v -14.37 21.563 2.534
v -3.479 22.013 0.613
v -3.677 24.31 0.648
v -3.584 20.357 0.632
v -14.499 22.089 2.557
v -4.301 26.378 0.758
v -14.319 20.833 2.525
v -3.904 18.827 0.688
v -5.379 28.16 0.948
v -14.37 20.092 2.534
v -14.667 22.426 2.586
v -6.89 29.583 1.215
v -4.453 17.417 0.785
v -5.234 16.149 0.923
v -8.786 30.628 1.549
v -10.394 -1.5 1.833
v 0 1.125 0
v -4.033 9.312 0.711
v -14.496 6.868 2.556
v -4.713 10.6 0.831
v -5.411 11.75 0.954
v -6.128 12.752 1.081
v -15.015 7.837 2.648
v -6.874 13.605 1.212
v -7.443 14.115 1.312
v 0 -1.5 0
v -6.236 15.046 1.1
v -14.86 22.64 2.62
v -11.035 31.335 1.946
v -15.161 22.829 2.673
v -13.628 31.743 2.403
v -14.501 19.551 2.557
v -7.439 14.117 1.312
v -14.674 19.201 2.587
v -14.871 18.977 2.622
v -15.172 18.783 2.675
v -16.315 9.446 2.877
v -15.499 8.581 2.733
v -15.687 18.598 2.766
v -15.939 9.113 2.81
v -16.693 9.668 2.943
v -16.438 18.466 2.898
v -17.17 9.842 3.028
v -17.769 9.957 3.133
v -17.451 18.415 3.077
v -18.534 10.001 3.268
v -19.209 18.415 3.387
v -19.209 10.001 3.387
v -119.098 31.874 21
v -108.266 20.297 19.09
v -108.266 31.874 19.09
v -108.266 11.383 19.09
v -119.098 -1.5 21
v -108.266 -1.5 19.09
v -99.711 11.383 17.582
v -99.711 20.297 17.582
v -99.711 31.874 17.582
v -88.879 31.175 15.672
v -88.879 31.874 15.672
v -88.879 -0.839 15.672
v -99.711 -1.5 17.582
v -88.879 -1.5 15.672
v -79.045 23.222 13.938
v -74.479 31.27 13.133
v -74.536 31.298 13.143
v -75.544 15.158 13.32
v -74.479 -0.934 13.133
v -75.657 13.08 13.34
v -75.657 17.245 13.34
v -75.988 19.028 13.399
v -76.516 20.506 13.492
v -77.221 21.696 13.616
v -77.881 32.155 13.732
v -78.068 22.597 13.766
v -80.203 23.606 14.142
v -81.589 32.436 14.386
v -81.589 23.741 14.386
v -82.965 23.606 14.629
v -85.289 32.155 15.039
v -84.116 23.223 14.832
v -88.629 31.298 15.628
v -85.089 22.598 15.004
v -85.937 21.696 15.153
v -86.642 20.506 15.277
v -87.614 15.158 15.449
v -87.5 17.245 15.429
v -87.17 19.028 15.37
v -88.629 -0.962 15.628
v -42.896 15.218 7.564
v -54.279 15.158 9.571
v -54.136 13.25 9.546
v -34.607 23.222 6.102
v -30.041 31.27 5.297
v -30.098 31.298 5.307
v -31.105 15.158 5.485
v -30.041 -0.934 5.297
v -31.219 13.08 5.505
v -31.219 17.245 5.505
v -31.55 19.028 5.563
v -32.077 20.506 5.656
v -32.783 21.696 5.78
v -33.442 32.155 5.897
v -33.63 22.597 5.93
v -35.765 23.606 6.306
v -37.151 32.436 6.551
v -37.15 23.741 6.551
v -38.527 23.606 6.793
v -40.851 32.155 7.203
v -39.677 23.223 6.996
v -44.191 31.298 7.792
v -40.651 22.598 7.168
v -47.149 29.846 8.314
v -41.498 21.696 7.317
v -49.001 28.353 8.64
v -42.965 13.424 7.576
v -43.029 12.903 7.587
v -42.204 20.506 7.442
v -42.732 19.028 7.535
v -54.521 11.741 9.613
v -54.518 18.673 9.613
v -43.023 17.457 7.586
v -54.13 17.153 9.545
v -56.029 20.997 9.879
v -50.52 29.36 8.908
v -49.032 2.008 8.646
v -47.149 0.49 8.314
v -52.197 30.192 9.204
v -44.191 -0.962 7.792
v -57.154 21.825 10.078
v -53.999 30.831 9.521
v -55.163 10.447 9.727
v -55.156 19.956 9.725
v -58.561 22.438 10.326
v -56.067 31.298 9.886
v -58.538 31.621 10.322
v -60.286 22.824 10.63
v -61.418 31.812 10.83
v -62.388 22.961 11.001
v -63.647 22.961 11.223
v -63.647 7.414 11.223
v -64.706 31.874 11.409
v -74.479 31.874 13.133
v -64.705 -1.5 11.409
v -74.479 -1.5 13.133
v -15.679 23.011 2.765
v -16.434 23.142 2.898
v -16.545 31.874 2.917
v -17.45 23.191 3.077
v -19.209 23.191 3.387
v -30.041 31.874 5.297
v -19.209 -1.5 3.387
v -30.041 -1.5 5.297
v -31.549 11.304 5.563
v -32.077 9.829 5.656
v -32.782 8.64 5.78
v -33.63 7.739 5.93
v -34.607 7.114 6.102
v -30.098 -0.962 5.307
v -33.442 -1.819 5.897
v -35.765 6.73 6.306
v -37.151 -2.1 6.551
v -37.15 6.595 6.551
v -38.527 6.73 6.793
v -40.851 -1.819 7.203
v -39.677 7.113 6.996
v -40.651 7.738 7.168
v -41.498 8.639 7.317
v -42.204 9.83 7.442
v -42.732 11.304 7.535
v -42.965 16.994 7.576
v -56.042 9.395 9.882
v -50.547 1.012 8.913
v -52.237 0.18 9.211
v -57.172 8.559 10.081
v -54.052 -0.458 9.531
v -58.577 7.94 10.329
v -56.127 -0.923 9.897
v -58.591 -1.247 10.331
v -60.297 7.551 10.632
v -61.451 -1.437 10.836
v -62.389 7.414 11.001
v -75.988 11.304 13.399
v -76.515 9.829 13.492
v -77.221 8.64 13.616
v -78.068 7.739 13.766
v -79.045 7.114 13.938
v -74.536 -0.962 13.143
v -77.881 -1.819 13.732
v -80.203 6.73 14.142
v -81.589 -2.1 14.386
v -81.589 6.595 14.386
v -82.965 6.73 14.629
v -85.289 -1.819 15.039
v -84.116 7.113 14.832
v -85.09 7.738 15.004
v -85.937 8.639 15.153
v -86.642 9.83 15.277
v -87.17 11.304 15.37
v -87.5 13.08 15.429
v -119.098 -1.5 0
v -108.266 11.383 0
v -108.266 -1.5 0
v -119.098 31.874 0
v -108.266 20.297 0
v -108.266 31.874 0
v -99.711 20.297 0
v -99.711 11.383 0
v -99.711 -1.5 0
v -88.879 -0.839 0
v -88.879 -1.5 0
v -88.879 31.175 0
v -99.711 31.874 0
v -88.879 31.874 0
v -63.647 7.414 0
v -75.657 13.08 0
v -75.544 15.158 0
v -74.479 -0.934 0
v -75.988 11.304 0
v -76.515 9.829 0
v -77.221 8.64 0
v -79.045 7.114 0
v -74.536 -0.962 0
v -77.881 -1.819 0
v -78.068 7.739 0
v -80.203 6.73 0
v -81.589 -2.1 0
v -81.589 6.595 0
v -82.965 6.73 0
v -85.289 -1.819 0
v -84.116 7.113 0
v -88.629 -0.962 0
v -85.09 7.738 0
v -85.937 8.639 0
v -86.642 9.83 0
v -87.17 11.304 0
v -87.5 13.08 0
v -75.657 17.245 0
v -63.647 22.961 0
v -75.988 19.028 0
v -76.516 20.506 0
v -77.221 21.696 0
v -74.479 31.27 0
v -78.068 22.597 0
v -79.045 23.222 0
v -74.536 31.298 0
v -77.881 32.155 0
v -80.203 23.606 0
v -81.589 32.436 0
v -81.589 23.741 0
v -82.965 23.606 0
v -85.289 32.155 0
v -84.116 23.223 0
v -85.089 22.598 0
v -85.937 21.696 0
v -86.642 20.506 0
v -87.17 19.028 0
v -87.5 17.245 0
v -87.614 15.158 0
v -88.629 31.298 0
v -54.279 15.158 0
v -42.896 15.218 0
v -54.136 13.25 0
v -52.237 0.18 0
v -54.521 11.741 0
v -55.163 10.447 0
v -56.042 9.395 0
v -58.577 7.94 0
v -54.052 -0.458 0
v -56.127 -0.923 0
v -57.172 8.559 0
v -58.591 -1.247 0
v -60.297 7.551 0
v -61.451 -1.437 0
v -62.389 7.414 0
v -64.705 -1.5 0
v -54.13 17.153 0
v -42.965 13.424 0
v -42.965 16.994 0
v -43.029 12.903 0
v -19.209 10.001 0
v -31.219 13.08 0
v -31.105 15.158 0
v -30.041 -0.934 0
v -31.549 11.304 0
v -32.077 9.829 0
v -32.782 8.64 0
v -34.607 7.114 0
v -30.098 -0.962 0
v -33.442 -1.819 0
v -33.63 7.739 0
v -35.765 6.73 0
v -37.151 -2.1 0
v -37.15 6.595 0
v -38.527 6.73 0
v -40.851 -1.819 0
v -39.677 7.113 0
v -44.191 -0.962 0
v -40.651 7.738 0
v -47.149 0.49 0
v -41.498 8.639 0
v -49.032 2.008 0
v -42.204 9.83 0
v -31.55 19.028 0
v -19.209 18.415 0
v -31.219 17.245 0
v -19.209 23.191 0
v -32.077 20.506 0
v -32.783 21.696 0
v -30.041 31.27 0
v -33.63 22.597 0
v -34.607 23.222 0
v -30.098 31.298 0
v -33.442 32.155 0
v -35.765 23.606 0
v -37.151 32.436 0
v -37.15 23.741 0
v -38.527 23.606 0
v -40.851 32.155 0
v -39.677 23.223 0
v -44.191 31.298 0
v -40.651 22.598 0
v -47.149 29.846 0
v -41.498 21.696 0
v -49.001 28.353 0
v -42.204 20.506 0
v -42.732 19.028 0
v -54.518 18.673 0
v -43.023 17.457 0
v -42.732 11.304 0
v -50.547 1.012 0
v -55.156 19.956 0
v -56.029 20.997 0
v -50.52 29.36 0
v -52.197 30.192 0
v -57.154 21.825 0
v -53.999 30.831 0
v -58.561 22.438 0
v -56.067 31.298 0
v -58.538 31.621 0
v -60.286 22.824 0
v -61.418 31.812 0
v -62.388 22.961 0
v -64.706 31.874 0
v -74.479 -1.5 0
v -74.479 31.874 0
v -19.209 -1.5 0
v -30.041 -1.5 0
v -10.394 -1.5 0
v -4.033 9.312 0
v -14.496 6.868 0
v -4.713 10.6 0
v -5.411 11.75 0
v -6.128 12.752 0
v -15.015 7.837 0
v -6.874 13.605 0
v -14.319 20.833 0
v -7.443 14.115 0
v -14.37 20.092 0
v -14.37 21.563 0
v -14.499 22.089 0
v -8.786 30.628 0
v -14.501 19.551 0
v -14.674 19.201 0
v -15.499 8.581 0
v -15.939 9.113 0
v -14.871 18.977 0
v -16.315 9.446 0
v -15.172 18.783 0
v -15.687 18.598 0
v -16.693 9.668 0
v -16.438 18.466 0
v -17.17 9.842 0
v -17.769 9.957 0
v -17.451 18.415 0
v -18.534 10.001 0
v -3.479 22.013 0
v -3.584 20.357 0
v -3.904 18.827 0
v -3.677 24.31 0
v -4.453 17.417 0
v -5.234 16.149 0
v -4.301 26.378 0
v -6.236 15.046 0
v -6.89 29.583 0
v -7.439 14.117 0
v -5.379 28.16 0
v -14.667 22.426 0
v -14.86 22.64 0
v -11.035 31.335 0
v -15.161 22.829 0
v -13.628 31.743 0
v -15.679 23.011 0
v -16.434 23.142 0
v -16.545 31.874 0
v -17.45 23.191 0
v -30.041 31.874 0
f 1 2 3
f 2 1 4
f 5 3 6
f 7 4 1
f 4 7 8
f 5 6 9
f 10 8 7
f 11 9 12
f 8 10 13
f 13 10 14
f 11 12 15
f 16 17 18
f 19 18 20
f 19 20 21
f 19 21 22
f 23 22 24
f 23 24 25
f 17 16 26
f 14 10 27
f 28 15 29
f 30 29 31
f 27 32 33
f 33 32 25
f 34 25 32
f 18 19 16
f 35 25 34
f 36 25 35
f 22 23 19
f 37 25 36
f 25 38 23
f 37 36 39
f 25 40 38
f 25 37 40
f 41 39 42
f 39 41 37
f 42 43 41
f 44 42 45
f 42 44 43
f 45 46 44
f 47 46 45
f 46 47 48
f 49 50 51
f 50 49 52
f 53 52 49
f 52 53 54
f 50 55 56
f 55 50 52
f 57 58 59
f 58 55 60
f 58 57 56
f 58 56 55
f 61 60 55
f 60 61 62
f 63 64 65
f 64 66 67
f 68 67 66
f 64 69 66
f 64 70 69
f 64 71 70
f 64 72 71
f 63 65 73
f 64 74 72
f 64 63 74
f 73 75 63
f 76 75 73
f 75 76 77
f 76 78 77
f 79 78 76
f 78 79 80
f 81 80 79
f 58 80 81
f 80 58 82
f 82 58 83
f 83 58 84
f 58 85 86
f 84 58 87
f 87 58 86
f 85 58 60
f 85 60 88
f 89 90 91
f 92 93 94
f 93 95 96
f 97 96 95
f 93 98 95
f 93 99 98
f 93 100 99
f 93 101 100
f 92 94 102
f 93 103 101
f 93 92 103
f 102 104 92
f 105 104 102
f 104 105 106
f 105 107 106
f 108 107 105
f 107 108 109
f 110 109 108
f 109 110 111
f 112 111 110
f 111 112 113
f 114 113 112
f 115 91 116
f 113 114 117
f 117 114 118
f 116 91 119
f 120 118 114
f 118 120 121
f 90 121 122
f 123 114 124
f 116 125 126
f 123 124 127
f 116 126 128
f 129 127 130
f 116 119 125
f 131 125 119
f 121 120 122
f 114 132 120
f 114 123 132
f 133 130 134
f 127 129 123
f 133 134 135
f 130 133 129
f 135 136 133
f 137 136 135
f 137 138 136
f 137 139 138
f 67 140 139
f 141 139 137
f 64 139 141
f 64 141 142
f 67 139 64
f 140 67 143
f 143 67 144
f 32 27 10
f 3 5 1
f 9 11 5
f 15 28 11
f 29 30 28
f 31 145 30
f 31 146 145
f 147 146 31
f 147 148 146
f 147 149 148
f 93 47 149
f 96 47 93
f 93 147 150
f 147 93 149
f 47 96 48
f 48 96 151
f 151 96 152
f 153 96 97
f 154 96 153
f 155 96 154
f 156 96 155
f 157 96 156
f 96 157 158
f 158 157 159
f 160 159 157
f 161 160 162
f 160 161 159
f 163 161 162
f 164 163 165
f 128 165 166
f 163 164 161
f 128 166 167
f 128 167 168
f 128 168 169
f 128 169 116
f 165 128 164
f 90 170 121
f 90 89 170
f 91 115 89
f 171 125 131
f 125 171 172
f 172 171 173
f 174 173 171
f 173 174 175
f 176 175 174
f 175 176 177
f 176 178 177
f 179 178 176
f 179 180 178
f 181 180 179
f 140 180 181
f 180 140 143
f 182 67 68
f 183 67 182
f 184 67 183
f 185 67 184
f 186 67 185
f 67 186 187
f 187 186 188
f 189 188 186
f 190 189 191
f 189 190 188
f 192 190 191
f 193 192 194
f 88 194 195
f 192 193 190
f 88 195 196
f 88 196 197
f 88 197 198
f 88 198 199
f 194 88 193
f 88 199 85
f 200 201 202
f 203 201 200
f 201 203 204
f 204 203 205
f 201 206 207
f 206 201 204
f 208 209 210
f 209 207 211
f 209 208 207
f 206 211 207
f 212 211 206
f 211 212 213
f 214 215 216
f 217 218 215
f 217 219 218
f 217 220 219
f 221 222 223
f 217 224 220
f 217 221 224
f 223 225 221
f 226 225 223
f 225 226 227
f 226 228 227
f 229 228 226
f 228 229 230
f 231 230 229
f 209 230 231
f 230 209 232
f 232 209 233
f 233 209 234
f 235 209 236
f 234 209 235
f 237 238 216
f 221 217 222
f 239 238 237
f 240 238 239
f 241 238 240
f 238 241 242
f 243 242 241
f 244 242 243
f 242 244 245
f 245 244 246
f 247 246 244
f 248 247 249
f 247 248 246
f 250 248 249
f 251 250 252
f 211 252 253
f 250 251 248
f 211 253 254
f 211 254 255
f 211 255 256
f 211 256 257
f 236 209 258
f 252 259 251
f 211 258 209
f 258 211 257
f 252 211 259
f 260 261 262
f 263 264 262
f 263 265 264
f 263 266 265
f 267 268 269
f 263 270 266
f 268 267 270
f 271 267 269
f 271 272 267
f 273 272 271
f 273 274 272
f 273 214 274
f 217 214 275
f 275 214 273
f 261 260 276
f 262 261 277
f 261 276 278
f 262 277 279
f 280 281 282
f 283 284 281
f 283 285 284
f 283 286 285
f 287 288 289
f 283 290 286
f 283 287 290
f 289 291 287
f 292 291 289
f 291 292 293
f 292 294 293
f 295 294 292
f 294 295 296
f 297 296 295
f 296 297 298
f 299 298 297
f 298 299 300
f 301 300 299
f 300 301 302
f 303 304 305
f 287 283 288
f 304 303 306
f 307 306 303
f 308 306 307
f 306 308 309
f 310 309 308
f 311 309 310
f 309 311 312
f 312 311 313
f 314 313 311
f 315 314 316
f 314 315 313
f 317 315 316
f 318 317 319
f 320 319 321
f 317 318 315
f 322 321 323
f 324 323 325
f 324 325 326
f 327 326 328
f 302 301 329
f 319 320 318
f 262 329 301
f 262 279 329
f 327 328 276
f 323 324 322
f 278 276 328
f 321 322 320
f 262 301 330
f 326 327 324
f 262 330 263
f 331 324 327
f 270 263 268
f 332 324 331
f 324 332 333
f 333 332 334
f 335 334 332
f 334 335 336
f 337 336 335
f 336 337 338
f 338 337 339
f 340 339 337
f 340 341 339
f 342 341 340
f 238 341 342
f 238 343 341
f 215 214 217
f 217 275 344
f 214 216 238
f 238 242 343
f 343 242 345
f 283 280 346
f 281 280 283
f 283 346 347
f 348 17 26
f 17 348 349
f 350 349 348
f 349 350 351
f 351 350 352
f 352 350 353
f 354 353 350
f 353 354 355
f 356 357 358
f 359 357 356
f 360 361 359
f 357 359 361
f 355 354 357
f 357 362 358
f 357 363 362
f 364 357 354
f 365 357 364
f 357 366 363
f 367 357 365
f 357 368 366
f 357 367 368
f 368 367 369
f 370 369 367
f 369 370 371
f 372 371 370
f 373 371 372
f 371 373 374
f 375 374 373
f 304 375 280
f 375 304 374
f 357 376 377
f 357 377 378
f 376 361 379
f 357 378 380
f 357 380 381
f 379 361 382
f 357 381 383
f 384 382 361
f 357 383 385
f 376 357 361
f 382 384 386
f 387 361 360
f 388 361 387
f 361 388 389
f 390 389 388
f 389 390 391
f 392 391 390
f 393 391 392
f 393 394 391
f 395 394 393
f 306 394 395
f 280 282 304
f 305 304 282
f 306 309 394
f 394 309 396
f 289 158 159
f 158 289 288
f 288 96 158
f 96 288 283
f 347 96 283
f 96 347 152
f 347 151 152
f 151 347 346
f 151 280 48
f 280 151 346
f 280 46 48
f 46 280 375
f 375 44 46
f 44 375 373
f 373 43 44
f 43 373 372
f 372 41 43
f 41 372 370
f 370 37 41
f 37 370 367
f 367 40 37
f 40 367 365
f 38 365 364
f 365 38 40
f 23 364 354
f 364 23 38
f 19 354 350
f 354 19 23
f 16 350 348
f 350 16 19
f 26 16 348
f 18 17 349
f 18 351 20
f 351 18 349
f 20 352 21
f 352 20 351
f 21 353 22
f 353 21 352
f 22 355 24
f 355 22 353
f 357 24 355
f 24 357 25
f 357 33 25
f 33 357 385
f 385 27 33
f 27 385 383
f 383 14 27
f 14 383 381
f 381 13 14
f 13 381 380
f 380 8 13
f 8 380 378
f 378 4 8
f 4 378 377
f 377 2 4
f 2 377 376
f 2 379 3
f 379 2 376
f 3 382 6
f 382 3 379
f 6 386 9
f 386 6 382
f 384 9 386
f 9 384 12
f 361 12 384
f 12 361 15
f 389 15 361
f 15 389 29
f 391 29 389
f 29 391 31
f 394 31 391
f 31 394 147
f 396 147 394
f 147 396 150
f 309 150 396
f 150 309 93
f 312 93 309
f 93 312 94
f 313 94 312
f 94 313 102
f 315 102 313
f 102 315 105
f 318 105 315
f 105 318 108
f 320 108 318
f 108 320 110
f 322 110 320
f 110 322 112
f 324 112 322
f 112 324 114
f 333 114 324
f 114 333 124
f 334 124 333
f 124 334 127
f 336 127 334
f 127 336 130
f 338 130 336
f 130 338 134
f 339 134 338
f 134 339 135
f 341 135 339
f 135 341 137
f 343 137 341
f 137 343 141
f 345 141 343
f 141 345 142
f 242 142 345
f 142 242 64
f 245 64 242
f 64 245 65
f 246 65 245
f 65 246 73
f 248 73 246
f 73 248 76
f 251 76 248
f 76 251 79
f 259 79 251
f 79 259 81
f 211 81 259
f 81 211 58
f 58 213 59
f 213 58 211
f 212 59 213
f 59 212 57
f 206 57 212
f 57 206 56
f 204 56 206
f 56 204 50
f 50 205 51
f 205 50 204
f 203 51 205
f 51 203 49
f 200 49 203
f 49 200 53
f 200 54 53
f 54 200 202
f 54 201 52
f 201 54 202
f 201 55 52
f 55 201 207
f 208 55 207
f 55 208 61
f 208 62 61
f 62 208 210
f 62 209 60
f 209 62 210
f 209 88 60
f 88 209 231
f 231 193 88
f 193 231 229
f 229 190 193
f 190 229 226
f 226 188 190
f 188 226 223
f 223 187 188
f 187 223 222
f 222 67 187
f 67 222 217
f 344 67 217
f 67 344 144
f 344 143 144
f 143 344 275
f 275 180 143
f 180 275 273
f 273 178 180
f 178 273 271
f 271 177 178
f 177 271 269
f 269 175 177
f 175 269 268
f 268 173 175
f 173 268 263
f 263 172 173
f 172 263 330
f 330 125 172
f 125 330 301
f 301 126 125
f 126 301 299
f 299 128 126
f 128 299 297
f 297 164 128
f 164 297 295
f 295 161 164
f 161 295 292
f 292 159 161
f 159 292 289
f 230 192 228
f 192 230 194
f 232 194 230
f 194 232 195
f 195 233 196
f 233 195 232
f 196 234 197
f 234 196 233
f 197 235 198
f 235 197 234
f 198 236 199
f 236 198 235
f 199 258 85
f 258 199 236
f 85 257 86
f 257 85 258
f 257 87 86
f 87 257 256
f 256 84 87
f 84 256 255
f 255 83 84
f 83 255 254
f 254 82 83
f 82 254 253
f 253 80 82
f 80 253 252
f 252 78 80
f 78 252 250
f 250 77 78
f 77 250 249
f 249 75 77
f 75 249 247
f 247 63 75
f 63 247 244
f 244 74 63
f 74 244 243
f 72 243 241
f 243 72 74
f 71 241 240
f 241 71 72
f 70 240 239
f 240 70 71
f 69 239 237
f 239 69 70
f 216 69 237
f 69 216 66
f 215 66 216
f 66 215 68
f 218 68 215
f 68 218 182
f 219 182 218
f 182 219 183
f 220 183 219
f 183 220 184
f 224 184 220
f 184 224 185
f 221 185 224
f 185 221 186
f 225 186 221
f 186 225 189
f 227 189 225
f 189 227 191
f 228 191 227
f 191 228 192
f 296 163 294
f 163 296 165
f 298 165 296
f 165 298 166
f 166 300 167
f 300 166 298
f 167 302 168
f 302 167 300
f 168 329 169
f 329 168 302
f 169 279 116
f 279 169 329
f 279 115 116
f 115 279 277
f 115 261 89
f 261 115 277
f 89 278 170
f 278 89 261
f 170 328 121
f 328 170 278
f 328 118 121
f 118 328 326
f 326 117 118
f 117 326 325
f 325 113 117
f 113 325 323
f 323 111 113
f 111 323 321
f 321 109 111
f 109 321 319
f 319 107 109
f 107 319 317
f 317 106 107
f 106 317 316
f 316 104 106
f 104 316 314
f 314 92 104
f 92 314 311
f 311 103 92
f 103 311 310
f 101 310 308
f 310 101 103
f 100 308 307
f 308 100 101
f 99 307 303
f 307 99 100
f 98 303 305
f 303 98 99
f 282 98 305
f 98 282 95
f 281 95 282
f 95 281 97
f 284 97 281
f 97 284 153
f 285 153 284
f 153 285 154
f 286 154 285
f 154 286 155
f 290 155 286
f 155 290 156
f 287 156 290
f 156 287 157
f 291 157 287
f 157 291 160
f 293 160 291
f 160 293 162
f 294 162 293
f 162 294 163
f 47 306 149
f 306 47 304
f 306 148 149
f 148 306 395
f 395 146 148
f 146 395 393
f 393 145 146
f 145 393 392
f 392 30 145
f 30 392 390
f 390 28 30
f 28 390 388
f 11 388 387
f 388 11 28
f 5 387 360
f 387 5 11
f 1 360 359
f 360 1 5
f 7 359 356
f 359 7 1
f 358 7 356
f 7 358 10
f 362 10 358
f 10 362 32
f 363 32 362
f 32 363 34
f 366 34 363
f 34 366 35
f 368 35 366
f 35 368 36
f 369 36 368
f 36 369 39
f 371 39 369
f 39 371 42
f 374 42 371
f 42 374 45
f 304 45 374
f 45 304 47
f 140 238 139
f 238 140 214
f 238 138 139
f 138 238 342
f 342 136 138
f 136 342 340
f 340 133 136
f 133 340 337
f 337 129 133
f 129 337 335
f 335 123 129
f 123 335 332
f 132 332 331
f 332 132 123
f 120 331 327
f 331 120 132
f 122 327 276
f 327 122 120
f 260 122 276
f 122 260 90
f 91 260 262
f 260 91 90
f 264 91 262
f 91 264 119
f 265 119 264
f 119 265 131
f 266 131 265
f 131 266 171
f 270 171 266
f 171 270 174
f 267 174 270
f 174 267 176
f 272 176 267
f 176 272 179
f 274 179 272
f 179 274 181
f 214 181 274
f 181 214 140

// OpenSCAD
intersection(){
  translate([0,-5,0]) rotate([0,190,0]) cube([150,60,30]);
  translate([-12,0,0])  linear_extrude(height = 25) offset(delta = 1.5){
    text(text="HODOR",font="Castellar:Bold",size=30,spacing=0.65, halign = "right");
  }
}
